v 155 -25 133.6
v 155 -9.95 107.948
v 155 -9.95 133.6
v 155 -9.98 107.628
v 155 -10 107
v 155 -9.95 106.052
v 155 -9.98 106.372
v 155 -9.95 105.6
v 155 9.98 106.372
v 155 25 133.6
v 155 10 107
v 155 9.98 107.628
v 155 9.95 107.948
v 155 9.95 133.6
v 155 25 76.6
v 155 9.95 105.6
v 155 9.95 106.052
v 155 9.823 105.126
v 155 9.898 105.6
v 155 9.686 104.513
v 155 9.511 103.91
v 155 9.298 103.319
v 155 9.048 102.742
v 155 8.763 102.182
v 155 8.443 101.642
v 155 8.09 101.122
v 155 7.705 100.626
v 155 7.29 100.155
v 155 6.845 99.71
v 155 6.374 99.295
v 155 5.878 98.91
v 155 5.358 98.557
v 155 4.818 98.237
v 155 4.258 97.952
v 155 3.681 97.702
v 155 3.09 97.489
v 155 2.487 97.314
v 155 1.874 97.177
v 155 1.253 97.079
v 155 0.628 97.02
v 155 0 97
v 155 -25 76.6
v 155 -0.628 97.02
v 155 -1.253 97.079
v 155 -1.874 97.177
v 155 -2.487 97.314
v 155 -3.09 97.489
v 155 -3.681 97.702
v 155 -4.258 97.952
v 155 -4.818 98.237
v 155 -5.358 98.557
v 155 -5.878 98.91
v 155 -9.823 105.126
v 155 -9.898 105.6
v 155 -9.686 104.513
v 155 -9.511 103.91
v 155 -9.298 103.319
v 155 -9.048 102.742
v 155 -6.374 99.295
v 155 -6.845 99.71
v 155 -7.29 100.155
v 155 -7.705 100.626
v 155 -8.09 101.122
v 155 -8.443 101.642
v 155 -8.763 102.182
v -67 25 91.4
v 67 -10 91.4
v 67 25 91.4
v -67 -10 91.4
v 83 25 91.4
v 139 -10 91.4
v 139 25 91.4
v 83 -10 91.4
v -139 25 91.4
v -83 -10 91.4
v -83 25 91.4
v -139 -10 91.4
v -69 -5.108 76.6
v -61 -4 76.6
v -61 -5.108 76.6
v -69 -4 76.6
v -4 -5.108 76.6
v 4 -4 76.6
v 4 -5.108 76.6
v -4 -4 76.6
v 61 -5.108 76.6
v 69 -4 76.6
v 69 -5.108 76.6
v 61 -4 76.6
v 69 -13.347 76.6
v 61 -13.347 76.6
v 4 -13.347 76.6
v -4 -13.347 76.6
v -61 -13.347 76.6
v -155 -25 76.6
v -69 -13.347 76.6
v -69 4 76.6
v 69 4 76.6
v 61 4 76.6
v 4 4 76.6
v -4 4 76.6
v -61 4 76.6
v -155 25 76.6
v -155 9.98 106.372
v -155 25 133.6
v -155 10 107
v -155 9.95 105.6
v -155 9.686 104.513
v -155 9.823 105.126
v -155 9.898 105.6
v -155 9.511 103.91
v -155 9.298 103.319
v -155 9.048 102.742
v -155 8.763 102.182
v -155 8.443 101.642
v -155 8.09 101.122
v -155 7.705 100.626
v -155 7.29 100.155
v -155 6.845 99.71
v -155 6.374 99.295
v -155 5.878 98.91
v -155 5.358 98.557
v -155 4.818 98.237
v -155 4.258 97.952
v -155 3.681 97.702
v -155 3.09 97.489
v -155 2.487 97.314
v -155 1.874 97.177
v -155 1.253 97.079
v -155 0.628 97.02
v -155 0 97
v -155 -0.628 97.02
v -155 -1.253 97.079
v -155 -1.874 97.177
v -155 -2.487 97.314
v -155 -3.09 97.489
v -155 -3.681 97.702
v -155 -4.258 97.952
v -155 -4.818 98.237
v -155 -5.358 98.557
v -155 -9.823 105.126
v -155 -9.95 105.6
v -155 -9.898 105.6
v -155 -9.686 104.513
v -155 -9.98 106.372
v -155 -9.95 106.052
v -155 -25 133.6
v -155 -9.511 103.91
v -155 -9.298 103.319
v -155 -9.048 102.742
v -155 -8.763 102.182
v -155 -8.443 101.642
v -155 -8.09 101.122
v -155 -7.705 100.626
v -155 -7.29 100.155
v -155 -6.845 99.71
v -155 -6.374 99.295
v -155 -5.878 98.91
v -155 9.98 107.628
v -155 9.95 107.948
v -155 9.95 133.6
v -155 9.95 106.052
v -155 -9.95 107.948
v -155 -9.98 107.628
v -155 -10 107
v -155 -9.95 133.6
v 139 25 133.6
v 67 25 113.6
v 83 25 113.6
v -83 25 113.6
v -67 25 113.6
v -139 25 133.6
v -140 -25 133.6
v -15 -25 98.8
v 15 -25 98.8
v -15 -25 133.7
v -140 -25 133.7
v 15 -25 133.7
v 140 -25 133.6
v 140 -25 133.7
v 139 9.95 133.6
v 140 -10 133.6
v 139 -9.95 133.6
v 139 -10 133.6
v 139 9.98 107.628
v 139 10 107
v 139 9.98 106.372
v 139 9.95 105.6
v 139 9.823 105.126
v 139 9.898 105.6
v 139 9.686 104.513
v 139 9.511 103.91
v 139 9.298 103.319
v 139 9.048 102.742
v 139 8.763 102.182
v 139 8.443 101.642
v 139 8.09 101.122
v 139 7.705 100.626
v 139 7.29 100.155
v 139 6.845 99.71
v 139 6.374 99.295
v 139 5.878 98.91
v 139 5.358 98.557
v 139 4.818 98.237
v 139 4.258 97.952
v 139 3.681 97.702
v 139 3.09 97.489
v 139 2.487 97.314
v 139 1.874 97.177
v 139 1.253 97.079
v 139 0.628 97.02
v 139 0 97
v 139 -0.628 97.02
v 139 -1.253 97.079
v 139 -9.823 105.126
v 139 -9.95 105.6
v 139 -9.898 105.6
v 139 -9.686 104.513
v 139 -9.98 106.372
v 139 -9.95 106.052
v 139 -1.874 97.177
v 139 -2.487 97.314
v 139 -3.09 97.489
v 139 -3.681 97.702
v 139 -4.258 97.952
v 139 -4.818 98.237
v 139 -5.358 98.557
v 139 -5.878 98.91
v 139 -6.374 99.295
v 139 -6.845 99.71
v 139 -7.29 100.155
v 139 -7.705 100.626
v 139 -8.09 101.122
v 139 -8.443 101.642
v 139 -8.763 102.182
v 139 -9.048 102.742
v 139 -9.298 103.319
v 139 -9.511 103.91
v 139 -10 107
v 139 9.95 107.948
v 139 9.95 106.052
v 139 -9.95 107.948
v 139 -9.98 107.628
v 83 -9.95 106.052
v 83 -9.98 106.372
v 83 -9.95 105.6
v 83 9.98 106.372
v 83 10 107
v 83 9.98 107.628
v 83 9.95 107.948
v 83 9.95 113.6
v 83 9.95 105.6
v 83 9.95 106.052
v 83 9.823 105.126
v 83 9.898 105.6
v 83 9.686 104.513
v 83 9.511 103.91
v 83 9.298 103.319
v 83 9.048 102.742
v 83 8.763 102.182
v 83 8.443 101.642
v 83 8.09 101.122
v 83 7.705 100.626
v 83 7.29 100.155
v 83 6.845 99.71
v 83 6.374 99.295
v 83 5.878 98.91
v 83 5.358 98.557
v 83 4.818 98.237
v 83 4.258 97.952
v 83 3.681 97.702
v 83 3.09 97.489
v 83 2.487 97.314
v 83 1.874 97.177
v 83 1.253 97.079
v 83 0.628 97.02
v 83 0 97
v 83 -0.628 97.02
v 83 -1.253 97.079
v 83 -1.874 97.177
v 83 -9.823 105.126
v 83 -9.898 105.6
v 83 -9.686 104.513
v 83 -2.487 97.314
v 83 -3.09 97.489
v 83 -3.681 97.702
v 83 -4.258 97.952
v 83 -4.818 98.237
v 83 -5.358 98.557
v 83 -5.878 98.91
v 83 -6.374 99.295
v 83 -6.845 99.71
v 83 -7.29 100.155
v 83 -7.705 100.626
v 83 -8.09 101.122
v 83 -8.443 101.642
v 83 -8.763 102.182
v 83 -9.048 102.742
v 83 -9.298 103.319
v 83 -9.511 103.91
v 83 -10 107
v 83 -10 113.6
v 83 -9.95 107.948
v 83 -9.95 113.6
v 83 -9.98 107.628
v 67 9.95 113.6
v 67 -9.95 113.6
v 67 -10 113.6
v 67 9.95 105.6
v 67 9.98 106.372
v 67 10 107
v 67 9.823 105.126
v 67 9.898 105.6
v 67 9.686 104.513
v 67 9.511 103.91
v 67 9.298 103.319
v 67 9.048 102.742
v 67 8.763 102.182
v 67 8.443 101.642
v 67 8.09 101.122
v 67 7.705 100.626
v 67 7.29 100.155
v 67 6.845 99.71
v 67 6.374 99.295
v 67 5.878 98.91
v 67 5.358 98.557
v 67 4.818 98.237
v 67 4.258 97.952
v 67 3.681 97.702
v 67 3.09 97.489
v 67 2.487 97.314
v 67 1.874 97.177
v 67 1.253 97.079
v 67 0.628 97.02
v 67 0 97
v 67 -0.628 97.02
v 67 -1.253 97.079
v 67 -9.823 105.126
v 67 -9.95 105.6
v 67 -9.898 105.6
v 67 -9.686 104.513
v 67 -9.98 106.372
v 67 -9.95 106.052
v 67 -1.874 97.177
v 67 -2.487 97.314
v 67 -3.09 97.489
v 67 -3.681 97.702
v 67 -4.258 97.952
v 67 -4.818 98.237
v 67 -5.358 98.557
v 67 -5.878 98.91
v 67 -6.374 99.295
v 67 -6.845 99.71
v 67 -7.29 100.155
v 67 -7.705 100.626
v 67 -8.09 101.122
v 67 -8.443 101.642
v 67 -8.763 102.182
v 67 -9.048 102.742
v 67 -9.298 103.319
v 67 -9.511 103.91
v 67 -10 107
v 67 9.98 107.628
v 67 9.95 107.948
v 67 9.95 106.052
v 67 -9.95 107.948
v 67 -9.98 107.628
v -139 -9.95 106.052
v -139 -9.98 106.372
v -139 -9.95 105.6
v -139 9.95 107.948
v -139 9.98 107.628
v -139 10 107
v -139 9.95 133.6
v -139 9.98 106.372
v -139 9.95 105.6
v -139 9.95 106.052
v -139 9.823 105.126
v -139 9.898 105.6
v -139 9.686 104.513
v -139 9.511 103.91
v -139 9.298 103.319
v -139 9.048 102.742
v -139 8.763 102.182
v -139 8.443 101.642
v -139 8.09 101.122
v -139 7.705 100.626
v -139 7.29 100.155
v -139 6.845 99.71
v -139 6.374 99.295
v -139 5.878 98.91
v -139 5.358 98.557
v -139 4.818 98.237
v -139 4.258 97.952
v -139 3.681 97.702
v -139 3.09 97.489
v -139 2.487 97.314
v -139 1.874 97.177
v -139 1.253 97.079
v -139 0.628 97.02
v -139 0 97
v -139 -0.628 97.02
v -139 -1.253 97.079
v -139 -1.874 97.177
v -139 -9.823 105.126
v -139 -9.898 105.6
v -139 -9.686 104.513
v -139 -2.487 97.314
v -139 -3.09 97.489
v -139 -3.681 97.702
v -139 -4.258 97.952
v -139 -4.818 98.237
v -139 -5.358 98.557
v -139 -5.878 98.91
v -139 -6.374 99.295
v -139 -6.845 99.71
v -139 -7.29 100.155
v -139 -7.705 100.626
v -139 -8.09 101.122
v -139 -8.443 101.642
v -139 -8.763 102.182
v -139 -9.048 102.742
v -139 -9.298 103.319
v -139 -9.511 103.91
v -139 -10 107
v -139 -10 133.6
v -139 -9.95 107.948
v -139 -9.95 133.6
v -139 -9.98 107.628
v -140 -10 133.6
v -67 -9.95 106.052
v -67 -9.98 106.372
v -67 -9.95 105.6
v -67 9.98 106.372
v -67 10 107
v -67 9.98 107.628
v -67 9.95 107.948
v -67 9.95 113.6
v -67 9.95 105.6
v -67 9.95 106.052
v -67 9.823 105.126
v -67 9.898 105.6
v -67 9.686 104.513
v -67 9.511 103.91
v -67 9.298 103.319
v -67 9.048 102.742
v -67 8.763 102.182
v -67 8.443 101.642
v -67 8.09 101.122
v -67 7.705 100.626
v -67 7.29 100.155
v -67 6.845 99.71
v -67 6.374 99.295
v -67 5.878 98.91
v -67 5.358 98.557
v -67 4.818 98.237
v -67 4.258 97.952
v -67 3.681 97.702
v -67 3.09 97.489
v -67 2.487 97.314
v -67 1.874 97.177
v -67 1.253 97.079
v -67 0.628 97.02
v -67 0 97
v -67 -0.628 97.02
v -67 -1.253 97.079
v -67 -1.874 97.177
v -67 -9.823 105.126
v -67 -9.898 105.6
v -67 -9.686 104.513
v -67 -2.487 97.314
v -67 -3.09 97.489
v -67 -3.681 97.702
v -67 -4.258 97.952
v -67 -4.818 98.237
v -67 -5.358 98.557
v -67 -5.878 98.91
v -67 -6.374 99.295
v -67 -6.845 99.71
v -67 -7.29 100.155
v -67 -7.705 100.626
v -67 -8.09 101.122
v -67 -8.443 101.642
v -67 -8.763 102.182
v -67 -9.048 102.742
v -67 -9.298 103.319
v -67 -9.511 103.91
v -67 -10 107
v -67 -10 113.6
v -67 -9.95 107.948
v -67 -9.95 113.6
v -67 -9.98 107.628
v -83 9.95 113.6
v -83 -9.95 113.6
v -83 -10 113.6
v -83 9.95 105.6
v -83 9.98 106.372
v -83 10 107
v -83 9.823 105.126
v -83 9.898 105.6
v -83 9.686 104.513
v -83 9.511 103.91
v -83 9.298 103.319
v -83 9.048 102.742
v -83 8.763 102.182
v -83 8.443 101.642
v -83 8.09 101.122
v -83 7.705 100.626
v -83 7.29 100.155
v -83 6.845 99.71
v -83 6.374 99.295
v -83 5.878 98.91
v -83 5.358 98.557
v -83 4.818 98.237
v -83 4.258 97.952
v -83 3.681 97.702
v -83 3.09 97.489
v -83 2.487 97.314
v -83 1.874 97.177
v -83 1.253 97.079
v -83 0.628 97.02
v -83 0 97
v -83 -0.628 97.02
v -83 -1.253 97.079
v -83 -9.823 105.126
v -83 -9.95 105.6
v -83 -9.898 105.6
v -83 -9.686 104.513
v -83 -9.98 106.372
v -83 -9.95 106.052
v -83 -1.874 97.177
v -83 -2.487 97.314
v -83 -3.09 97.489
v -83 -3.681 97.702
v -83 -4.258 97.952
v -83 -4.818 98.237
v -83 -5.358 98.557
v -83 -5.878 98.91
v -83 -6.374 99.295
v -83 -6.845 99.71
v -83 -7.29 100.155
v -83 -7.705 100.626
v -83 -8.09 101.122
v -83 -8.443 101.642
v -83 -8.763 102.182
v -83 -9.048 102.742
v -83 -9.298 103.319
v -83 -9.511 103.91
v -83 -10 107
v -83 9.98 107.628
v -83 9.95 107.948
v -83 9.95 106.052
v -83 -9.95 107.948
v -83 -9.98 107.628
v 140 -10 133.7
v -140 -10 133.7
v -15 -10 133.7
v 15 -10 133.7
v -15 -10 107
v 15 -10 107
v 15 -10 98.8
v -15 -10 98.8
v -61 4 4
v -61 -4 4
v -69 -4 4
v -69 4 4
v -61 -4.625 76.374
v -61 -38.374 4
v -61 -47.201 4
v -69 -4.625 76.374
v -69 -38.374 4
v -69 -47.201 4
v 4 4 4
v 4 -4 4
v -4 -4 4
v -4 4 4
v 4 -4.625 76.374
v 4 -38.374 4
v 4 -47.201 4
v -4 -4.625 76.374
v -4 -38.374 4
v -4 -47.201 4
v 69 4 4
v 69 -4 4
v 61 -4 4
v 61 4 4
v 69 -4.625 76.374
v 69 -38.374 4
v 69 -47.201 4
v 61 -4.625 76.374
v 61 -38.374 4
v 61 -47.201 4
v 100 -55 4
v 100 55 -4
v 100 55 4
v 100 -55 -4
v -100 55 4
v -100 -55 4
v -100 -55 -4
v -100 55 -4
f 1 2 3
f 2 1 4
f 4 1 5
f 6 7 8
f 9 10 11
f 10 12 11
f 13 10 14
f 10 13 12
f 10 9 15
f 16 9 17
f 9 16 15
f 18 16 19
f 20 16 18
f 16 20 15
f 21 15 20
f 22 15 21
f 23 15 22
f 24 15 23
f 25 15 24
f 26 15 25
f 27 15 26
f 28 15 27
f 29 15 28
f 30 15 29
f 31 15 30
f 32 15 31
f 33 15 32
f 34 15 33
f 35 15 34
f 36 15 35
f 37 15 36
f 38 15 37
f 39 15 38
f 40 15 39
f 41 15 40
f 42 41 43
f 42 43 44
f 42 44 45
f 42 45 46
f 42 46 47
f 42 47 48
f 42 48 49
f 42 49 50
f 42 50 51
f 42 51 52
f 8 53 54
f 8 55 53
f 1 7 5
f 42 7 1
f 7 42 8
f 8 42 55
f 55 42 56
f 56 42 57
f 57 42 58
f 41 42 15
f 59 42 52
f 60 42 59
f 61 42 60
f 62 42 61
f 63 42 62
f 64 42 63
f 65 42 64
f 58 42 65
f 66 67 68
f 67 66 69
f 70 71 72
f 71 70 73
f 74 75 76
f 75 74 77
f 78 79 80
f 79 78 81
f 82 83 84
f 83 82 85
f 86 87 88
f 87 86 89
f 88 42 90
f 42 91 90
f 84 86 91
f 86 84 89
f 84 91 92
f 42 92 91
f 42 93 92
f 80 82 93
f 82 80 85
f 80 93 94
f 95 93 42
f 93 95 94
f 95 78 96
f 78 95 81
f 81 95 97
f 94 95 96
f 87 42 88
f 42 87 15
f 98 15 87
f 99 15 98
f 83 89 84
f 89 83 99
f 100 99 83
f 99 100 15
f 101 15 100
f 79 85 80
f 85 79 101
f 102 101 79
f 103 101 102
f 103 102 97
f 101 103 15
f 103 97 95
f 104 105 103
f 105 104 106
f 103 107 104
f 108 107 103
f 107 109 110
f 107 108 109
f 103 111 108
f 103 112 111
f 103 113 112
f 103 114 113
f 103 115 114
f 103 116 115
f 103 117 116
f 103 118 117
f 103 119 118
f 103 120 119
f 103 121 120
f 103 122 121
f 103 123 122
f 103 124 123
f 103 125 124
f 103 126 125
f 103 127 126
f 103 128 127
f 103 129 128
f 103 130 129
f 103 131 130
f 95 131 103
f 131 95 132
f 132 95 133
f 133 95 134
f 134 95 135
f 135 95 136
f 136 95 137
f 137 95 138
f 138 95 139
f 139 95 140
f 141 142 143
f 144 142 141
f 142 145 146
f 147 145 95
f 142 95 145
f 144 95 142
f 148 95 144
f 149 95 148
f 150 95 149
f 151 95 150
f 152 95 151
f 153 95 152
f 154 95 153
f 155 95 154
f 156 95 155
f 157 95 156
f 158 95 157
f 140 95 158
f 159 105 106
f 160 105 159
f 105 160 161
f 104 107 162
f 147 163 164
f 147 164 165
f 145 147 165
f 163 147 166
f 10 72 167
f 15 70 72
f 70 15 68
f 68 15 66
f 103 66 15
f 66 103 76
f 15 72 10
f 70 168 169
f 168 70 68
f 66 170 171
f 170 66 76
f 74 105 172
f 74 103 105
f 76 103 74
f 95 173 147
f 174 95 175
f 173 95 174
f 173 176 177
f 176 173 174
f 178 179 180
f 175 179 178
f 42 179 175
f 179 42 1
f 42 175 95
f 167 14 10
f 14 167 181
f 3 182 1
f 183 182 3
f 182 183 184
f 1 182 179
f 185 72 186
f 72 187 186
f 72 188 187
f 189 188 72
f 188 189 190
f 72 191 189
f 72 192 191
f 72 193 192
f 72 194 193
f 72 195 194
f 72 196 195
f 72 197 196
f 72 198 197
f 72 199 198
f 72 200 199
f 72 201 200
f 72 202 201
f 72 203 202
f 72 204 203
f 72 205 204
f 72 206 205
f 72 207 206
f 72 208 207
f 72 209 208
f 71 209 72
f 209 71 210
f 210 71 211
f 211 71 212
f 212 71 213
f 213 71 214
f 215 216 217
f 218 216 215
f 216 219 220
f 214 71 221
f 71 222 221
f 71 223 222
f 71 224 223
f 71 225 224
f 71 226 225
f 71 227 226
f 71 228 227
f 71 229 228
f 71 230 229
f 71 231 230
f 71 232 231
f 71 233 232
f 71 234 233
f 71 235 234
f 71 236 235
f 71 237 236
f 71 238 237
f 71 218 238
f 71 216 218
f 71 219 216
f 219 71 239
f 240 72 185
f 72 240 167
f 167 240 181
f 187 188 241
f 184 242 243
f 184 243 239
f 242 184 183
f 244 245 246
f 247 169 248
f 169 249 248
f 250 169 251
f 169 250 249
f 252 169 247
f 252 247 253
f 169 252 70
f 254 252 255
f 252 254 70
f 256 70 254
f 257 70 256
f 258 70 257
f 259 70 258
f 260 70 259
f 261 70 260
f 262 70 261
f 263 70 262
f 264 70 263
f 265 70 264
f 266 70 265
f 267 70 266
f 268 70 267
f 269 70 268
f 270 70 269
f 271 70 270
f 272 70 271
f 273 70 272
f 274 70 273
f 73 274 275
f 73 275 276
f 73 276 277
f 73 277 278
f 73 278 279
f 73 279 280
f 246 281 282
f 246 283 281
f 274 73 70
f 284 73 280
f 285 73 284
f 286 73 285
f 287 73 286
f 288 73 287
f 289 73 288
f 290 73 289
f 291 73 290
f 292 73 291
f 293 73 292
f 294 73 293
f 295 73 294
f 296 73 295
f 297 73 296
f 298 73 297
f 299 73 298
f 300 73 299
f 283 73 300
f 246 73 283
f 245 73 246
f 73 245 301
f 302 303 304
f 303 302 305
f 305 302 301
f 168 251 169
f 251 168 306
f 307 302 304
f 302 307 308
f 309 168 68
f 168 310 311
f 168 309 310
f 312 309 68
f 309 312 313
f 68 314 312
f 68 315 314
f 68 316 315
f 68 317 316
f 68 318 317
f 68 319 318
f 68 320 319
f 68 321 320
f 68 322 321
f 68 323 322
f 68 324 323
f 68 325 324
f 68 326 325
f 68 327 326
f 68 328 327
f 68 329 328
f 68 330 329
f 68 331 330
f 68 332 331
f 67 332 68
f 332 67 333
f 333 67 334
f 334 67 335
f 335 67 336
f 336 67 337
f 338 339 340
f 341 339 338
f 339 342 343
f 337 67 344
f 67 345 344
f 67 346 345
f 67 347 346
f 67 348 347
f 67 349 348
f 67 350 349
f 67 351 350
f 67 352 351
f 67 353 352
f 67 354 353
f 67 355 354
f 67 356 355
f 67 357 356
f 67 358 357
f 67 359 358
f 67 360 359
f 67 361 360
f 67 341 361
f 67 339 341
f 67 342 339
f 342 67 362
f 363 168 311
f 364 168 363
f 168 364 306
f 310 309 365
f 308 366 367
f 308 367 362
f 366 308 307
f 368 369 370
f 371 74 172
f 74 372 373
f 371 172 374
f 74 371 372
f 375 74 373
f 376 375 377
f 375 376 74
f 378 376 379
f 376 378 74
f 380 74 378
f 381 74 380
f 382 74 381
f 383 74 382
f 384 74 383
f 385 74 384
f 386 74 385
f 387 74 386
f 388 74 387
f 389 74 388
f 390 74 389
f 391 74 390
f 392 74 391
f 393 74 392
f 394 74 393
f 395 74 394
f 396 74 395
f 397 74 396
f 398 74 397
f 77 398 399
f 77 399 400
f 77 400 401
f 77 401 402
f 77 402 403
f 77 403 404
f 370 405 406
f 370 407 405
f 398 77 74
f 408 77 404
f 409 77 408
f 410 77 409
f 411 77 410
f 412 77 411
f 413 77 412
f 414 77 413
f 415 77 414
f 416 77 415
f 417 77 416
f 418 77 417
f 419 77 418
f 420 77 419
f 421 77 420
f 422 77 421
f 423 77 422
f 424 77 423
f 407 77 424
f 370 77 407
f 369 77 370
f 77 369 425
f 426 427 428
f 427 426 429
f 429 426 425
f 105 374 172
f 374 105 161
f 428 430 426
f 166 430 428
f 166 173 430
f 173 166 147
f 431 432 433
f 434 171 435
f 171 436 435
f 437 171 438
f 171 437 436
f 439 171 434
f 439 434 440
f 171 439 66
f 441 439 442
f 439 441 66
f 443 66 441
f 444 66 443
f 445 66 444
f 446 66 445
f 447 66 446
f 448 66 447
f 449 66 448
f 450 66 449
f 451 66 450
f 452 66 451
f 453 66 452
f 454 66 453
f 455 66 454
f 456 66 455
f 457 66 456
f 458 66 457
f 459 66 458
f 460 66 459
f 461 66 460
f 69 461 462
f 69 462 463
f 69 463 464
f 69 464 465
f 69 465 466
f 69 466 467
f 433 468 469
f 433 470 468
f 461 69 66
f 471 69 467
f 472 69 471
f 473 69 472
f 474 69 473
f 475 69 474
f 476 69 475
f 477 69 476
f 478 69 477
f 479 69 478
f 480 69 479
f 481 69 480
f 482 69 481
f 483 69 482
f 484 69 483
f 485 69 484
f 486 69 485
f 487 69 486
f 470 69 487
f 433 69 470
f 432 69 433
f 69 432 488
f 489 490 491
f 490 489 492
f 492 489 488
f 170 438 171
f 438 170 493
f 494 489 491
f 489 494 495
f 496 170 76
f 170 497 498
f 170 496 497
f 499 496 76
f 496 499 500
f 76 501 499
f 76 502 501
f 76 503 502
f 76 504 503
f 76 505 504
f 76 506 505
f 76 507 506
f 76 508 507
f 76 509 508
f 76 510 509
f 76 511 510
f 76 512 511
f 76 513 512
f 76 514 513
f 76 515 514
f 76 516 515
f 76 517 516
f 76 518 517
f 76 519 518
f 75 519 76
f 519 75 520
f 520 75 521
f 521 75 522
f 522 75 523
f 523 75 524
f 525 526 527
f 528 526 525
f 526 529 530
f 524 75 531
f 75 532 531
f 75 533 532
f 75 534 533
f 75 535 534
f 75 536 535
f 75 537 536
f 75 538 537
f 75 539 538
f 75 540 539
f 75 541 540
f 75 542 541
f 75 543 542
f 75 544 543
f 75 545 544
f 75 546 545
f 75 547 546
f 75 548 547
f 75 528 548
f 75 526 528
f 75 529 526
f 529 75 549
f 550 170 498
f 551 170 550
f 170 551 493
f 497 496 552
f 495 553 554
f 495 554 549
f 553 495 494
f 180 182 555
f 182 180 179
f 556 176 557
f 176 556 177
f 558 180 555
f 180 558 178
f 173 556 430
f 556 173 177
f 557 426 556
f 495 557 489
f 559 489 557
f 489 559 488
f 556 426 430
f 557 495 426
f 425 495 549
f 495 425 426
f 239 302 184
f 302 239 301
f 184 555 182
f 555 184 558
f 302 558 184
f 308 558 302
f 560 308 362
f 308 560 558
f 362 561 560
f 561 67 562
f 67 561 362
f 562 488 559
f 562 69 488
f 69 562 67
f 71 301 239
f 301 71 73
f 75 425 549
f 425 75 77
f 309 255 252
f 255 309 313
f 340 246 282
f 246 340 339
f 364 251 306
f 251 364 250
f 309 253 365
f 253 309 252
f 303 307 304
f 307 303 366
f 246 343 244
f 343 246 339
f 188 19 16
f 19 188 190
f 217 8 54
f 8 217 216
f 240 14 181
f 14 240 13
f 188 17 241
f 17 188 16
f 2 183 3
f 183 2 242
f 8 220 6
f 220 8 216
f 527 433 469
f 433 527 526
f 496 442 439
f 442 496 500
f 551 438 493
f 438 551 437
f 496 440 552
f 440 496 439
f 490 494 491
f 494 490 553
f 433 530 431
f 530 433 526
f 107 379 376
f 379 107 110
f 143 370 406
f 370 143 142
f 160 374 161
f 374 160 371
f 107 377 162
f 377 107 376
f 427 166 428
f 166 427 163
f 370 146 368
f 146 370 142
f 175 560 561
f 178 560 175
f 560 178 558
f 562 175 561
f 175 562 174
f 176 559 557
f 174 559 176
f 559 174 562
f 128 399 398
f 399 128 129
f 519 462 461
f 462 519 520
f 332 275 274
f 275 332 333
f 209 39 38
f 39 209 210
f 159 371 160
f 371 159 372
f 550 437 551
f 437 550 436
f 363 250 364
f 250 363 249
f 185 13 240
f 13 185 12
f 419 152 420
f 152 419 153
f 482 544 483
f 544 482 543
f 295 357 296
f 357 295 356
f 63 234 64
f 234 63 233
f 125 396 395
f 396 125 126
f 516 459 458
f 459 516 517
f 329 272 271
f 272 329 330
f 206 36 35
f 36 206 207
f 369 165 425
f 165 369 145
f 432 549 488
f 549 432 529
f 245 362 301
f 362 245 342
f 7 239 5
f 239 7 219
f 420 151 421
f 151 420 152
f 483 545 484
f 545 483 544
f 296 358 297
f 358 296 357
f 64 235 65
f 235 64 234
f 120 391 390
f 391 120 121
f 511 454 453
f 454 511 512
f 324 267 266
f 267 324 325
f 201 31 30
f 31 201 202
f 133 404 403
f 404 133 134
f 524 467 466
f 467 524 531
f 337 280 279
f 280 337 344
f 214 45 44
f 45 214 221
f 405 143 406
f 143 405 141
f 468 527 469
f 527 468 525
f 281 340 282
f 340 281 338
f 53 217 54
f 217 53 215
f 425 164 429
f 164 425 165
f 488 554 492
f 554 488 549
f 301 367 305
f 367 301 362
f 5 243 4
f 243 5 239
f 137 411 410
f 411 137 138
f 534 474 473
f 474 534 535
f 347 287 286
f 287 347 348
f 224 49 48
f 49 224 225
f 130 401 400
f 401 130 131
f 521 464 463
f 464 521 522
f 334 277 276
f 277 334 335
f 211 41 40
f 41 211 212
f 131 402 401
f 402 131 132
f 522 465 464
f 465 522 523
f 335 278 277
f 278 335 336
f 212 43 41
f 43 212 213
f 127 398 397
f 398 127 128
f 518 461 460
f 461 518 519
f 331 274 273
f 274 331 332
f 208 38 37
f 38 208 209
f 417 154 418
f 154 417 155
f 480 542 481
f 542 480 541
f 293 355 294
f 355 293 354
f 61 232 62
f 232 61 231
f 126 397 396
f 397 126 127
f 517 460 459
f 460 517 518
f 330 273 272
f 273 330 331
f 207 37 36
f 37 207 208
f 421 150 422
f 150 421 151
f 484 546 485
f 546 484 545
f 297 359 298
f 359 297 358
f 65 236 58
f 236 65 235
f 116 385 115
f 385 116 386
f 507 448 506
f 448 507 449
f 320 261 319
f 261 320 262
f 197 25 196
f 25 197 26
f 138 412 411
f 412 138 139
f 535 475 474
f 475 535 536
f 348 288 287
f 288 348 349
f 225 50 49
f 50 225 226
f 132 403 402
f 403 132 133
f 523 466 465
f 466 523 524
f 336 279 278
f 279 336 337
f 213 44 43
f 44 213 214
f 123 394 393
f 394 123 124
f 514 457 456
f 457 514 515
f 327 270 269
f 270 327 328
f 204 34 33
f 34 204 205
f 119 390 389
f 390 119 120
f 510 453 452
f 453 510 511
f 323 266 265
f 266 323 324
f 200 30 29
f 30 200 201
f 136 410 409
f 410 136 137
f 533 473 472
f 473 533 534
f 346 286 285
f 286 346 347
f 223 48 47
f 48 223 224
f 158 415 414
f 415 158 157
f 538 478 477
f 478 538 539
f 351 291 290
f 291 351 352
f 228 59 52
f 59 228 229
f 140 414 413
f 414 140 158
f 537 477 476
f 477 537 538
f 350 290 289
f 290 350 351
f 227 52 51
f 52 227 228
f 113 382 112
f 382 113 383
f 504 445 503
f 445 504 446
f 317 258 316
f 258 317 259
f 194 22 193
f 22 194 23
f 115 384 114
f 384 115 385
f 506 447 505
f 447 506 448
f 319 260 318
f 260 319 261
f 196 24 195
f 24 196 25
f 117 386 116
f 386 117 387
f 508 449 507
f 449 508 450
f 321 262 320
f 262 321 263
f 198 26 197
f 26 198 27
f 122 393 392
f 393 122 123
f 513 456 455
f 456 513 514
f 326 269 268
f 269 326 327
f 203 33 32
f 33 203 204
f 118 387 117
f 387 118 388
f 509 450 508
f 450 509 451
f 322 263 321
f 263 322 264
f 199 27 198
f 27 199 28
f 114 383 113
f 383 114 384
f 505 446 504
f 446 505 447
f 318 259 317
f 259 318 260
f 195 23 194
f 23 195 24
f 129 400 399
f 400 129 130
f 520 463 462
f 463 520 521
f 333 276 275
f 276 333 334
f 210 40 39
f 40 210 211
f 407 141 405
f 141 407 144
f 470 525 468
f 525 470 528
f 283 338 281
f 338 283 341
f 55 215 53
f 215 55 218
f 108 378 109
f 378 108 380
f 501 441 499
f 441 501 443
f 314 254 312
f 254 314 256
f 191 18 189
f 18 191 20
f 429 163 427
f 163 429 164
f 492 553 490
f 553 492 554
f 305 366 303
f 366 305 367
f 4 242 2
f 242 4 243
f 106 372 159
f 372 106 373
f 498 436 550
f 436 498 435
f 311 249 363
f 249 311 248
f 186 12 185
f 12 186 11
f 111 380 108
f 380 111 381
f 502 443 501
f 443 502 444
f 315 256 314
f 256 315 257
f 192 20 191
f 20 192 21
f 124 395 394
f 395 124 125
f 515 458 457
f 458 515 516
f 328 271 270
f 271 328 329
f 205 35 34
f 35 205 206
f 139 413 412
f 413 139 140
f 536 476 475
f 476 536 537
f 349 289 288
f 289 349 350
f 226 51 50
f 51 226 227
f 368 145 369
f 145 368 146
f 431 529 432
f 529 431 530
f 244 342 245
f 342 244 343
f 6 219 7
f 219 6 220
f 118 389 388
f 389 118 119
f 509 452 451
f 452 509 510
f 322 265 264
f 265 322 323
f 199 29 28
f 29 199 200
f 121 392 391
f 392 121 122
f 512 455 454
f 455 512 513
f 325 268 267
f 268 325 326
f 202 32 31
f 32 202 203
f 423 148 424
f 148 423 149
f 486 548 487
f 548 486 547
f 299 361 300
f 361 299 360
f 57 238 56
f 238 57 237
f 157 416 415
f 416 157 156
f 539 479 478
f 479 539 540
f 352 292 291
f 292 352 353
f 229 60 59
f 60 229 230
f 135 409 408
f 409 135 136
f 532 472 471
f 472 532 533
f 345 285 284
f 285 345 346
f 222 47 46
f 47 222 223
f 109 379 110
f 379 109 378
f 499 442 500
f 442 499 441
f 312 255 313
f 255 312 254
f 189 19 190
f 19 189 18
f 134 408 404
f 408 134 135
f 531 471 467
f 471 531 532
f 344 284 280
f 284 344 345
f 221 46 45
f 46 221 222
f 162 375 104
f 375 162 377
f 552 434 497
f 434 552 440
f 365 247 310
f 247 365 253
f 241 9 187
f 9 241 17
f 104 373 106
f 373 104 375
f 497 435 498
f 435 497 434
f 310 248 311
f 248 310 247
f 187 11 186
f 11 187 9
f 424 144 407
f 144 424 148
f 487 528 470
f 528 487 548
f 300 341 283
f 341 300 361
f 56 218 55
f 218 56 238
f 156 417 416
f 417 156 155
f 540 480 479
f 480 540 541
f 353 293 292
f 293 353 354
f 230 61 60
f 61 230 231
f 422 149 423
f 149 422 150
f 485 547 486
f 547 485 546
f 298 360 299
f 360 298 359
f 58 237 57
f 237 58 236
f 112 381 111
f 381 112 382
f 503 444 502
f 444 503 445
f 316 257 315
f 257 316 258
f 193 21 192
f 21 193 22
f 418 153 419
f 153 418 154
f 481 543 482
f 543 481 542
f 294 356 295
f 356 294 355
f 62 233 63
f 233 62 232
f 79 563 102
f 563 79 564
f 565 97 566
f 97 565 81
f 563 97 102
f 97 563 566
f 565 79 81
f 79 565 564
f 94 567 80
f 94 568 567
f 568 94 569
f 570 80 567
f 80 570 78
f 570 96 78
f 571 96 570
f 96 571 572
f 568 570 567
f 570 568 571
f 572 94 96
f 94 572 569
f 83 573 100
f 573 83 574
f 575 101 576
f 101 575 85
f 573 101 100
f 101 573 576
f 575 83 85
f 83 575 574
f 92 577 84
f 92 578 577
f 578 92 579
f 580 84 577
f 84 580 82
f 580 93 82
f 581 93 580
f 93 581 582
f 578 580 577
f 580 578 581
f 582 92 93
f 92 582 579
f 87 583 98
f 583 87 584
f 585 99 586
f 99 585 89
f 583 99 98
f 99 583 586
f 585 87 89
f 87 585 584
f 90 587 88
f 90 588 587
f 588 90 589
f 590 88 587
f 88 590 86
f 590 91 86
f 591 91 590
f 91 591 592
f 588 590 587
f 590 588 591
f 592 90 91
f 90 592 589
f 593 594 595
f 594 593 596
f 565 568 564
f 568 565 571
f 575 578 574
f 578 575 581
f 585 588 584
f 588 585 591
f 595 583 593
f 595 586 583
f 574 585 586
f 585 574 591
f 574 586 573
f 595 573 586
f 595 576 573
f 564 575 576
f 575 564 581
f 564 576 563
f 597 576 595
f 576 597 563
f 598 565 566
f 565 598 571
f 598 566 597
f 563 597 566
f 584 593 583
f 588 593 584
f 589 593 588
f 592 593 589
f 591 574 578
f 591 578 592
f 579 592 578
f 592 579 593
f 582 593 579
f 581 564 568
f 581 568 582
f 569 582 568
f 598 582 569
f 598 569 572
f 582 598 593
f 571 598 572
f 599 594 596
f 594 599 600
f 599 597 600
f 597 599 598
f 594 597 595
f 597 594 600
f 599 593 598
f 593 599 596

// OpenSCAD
// file: clampipe.scad
   include <../robot_settings.scad>

module clam_pipe(show_blades = true, length_offset = 50, diameter = 19 ) {
      // clam pipe
       translate([0, 0, 0]) {
          rotate([0, 90, 0])
          cylinder(h = rail_width + length_offset, d = diameter, center = true);
       }

       blade_length = 48;
       filling_length = 26;
      
      // clams
      if (show_blades)
       translate([0, 13, 0])
       {
         // right upper clam blade -71.43 = 200 / 2.8 -> -76.43 /  200 = 1/2.62
         color("red")
        translate([-rail_width / 2 + 19,  15, rail_thickness])
        cube([rail_width / 5,  blade_length, rail_thickness], center = true);
         
         // right filling
         color("red")
         translate([-rail_width / 2 + 19, 2, -1])
         cube([rail_width / 5, filling_length, rail_thickness + 2], center = true);
         
         // right lower clam blade
         color("red")
        translate([-rail_width / 2 + 19,  15, -rail_thickness])
        cube([rail_width / 5,  blade_length, rail_thickness], center = true);
         
         // left filling
         color("green")
         translate([rail_width / 2 - 19, 2, -1])
         cube([rail_width / 5, filling_length, rail_thickness + 2], center = true);
         
        // left upper clam blade
        color("green")        
        translate([rail_width / 2 - 19,  15, rail_thickness])
        cube([rail_width / 5,  blade_length, rail_thickness], center = true);
        
         // left lower clam blade
        translate([rail_width / 2 - 19,  15, -rail_thickness])
        color("green")
        cube([rail_width / 5,  blade_length, rail_thickness], center = true);
      }
    }
    clam_pipe();
// file: ../robot_settings.scad
main_box_x = 100; // 96
main_box_y = 102;
main_box_z = 74; // 74.5

lfp_main_box_x = 65;
lfp_main_box_y = 152;
lfp_main_box_z = 94;

wall_thickness = 5;

rail_gap = 2;
rail_inset = 7;

rail_thickness = 7;
rail_length = 250;
rail_width = 260;

lfp_battery_width = 65.5;
lfp_battery_depth = 150.5;
lfp_battery_height = 93;
lfp_battery_midterrace_width = 64.8;
lfp_battery_midterrace_depth = 150.2;
lfp_battery_midterrace_height = 7.8;
lfp_battery_topterrace_width = 62.8;
lfp_battery_topterrace_depth = 149.4;
lfp_battery_topterrace_height = 6.6;

// red right
// black left
lfp_battery_terminal_width = 9.2;
lfp_battery_terminal_depth = 9.5;
lfp_battery_terminal_depth_setback = 4.4;
lfp_battery_terminal_width_setback = 5.9;

raspberry_pi_screw_seperation_y = 57;
raspberry_pi_screw_seperation_z = 48;
raspberry_pi_peg_h = 5;

battery_box_peg_h = 6;
battery_box_peg_d = 9.5;
battery_box_peg_cutout = 5;

gears_module = 1;
pinion_gear_teeth = 32;
pinion_gear_width = 5;
pinion_gear_bore = 8;

gears_setback_distance = 25;
gear_post_height = 2 * pinion_gear_width + rail_thickness + 8 ;

steering_motor_mount_x = 45;
steering_motor_mount_y = 36;
steering_motor_mount_z = 18;
steering_motor_mount_setback_distance = gears_setback_distance + 16;

cradle_wall_thickness = 5;
post_thickness_x_y = 10;
post_wallside_position_y = 12.5;
post_separation_y = 47.5;
post_x_position = 70; // width of cradle. this is proportional to rail_width.

imu_width = 26; // x is along the width axis
imu_depth = 16; // y is along the depth axes. +y points at pins.
imu_screw_d = 3;
imu_screw_corner_border = 1.27;
imu_underside_pin_h = 1; // z is along the h axis
imu_thickness = 1.6;
imu_left_edge_pins = 1.6;

dc_motor_drivertype = "Teyleten"; // Teyleten
isAdafruit = (dc_motor_drivertype == "Adafruit");

drv8871_x = isAdafruit ? 20.3 : 21.6;
drv8871_y = isAdafruit ?  24 : 25;

drv8871_z = 2;
drv8871_screw_d = 2.5;
drv8871_solder_points_z = 2;

drv8871mount_edge_x = 1.5;
drv8871mount_edge_wall = 3;
drv8871mount_z = 5;
drv8871mount_x = drv8871_x +  drv8871mount_edge_wall - 2* drv8871mount_edge_x;
drv8871mount_y = 19;

drv8871_screw_distance = 15.64;
drv8871_solder_points_d = 1.66;
drv8871_solder_offset_y = 4.4;
drv8871_solder_inner_points_distance = 5;
drv8871_solder_outer_points_distance = 12;

dc_motor_75_1_encoder_z = 14.75;
dc_motor_75_1_encoder_d = 24.5;
dc_motor_75_1_housing_z = 30;
dc_motor_75_1_housing_d = 24.1;
dc_motor_75_1_gearbox_z = 23;
dc_motor_75_1_gearbox_d = 24.8;
dc_motor_75_1_z = dc_motor_75_1_encoder_z + dc_motor_75_1_housing_z + dc_motor_75_1_gearbox_z;

dc_motor_housing_minus_encoder_z = 48;
dc_motor_encoder_z = 9.33;
dc_motor_encoder_wheel_d = 13.4;
dc_motor_encoder_wheel_thickness = 5;
dc_motor_encoder_wheel_gap = 3;
dc_motor_encoder_circuit_thickness = 2;
dc_motor_z = dc_motor_housing_minus_encoder_z + dc_motor_encoder_z + dc_motor_encoder_wheel_thickness + dc_motor_encoder_wheel_gap + dc_motor_encoder_circuit_thickness;
dc_motor_cutout_d = 24.8;
dc_motor_cutout_z = 19.5;


M3_shaft_d = 2.82;

dc_motor_screw_head_z = 2;
dc_motor_screw_head_d = 5.6;
dc_motor_screw_d = 3.2;
dc_motor_screw_offset = 8.5;

dc_motor_axle_ring_z = 3;
dc_motor_axle_ring_d = 7.2;
dc_motor_axle_cutout_d = 4.2;
dc_motor_axle_cutout_z = 10;
dc_motor_axle_notch_cutout = 0.4;
dc_motor_axle_notch_cutout_z = 6;

pdmount_x = 20;
pdmount_y = 30;
pdmount_z = 2;
pdmount_edge_x = 1.5;
pdmount_edge_wall = 3;

steering_shaft_z = 45;
steering_shaft_d = 7;
steering_shaft_motor_fitting_d = 9;
coupler_length = 24.6;
coupler_diameter = 14;
coupler_screw_d = 4;
coupler_screw_z_offset = 8.3;
coupler_gear_side_insert = 12.6;
steering_shaft_with_coupler_z = steering_shaft_z - coupler_gear_side_insert;

lidar_mount_y = 110;
lidar_mount_x = 65 + 20;
lidar_narrow_screws = 40;
lidar_wide_screws = 56;
lidar_front_to_back_screws = 70;
lidar_screw_d = 3;
lidar_circuitboard_x = 20;
lidar_circuitboard_y = 35;
lidar_circuitboard_z = 1.2;
lidar_cord_length = 29;

ball_bearing_height = 7;
ball_bearing_outer_diameter = 22;
ball_bearing_inner_diameter = 8;

M4_diameter = 5.1;
M3_diameter = 2.9;
M3_length = 35;
M3_cap_length= 3;
M3_cap_diameter = 5.44;

suspension_spring_outer_diameter = 8;
suspension_spring_inner_diameter = 5.3;

armature_holder_height = 20;
armature_holder_thickness = 8;
pull_bar_peg_r = 3.2;
apparatus_locking_peg_d = 4;

rack_module = 1;
rack_length = main_box_x;
rack_height = 5;
rack_width = 10;
rack_teeth = 30;
rack_bore = 3;

pull_bar_length = rail_width / 2 - rack_length + 1;

// tire hardware
axle_length = 42.0; 
axle_reciever_inner_diameter = ball_bearing_inner_diameter;
axle_reciever_outer_diameter = 12;
axle_reciever_length = 18.8;
axle_notch_length = 15;
axle_notch_cutout = 2.4;

// power distribution bar
power_bar_cutout_x = 96;
power_bar_y = 19.1;
power_bar_z = 1.5;
power_bar_screw_distance = 91.4;
power_bar_screw_d = 2.8;
power_bar_standoff_z = 5;
power_bar_standoff_d = 6.83;

pico_expander_width = 63;
pico_expander_height = 57;
pico_screw_hole_offset = 3;
pico_screw_hole_d = 2.5;

usbhub_thickness = 11.7;
usbhub_depth = 37.5;
usbhub_width = 86.7;
usbhub_end_port_width = 14.8;
usbhub_end_port_height = 12;
usbhub_front_face_safe_zone_left = 15;
usbhub_front_face_safe_zone_right = 14.8;

switch_w = 16;
switch_cutout_d = 12.2;
switch_bump_h = 2;
switch_bump_l = 18.2;

i2c_mount_thickness = 3;
i2c_w = 28;
i2c_l = 28;
i2c_circuitboard_thickness = 1.23;
i2c_bottom_notch_w = 14.35;
i2c_bottom_notch_depth = 1;
i2c_screw_hole_d = 1.9;
i2c_screw_hole_offset = 1.4;
i2c_pin_l = 11;
i2c_pin_d = 0.8;
i2c_pin_offset = 1.5;
i2c_pin_separation = 2.5;
i2c_all_pins_l = 8.3;
i2c_screen_thickness = 1.88;
i2c_screen_w = 14.6;
i2c_screen_d = 27;
i2c_screen_offset = 4.1;
// main file
   include <../robot_settings.scad>
   use <clampipe.scad>
   $fn = 100;
   
   // front end jack
  module back_jack(
    show_pipe = false,
    show_structure = true
    ) {
      
  if (show_structure == true) {
      // platform
      translate([0,  0, 0])
      color("brown")
      cube([200, 110, 8], center = true);
      
      thickness_offset = 10;
      rail_width_offset = 50;
      pipe_cutout_depth = 19.9; 
 
      translate([0, 0, -16]) {
      // top holder structure
          difference() {
              translate([0, 0, 100]) {
                  union() {
                      color("orange")
                      cube([rail_width + rail_width_offset, 50, dc_motor_cutout_d - thickness_offset], center = true);
                      
                      color("red")
                      translate([rail_width / 2 + 17, 0, dc_motor_cutout_d])
                      cube([16, rail_width_offset, 2 * dc_motor_cutout_d ], center = true);

                      color("yellow")
                      translate([rail_width / 2 - 55, 0,  dc_motor_cutout_d - 10])
                      cube([16, rail_width_offset, 2 * dc_motor_cutout_d - 20 ], center = true);

                      color("green")
                      translate([-rail_width / 2 - 17, 0, dc_motor_cutout_d])
                      cube([16, rail_width_offset, 2 * dc_motor_cutout_d ], center = true);

                      color("pink")
                      translate([-rail_width / 2 + 55, 0,  dc_motor_cutout_d - 10])
                      cube([16, rail_width_offset, 2 * dc_motor_cutout_d - 20], center = true);
                      
                      color("cyan")
                      translate([0, -17.5, dc_motor_cutout_d])
                      cube([rail_width + 20, 15, dc_motor_cutout_d + 25], center = true);
                  }
              }
              
              pipe_cutout_h = 98 + 41;

              translate([rail_width / 2 - 55, 0, pipe_cutout_h])
              cube([18, pipe_cutout_depth, dc_motor_cutout_d + 10], center = true);
              
              translate([rail_width / 2 + 17, 0, pipe_cutout_h])
              cube([18, pipe_cutout_depth, dc_motor_cutout_d + 10], center = true);

              translate([-rail_width / 2 + 55, 0, pipe_cutout_h])
              cube([18, pipe_cutout_depth, dc_motor_cutout_d + 10], center = true);
              
              translate([-rail_width / 2 - 17, 0, pipe_cutout_h])
              cube([18, pipe_cutout_depth, dc_motor_cutout_d + 10], center = true);

              //imu cutout
              translate([-30/2, -30, dc_motor_cutout_d + 90])
             cube([ 30,  2 * pipe_cutout_depth,  40]);
              
              translate([0,0, 98+ 25])
              clam_pipe(show_blades = false, length_offset = 80, diameter = 20); 
        }
  }

    difference() {
      
      union () {
         // left post
        translate([-65, 0, 40])
        color("cyan")
        cube([8, 8, 80], center = true);
        
        // left back support
        translate([-65,  -26, 40])
        rotate([-25, 0, 0])
        color("cyan")
        cube([8, 8, 84], center = true);
        
        // center post
        translate([0, 0, 40])
        color("gray")
        cube([8,8, 80], center = true);
       
        // center back support 
        translate([0,  -26, 40])
        rotate([-25, 0, 0])
        color("gray")
        cube([8, 8, 84], center = true);
        
        // right post
        translate([65, 0, 40])
        color("magenta")
        cube([8, 8, 80], center = true);
        
        // right back support 
        translate([65,  -26, 40])
        rotate([-25, 0, 0])
        color("magenta")
        cube([8, 8, 84], center = true);
      }
     
      // carve out for clam pipe (otherwise the support columns get in the way
       translate([50, 0, 108])
        rotate([0, 90, 0])
        cylinder(h = 2 * rail_width, d =21, center = true);
    }
}


  if (show_pipe) {
      // clam pipe
       translate([0, 0, 107]) {
         rotate([0, 0, 0])
         clam_pipe();
       }
  }
  }
back_jack();
